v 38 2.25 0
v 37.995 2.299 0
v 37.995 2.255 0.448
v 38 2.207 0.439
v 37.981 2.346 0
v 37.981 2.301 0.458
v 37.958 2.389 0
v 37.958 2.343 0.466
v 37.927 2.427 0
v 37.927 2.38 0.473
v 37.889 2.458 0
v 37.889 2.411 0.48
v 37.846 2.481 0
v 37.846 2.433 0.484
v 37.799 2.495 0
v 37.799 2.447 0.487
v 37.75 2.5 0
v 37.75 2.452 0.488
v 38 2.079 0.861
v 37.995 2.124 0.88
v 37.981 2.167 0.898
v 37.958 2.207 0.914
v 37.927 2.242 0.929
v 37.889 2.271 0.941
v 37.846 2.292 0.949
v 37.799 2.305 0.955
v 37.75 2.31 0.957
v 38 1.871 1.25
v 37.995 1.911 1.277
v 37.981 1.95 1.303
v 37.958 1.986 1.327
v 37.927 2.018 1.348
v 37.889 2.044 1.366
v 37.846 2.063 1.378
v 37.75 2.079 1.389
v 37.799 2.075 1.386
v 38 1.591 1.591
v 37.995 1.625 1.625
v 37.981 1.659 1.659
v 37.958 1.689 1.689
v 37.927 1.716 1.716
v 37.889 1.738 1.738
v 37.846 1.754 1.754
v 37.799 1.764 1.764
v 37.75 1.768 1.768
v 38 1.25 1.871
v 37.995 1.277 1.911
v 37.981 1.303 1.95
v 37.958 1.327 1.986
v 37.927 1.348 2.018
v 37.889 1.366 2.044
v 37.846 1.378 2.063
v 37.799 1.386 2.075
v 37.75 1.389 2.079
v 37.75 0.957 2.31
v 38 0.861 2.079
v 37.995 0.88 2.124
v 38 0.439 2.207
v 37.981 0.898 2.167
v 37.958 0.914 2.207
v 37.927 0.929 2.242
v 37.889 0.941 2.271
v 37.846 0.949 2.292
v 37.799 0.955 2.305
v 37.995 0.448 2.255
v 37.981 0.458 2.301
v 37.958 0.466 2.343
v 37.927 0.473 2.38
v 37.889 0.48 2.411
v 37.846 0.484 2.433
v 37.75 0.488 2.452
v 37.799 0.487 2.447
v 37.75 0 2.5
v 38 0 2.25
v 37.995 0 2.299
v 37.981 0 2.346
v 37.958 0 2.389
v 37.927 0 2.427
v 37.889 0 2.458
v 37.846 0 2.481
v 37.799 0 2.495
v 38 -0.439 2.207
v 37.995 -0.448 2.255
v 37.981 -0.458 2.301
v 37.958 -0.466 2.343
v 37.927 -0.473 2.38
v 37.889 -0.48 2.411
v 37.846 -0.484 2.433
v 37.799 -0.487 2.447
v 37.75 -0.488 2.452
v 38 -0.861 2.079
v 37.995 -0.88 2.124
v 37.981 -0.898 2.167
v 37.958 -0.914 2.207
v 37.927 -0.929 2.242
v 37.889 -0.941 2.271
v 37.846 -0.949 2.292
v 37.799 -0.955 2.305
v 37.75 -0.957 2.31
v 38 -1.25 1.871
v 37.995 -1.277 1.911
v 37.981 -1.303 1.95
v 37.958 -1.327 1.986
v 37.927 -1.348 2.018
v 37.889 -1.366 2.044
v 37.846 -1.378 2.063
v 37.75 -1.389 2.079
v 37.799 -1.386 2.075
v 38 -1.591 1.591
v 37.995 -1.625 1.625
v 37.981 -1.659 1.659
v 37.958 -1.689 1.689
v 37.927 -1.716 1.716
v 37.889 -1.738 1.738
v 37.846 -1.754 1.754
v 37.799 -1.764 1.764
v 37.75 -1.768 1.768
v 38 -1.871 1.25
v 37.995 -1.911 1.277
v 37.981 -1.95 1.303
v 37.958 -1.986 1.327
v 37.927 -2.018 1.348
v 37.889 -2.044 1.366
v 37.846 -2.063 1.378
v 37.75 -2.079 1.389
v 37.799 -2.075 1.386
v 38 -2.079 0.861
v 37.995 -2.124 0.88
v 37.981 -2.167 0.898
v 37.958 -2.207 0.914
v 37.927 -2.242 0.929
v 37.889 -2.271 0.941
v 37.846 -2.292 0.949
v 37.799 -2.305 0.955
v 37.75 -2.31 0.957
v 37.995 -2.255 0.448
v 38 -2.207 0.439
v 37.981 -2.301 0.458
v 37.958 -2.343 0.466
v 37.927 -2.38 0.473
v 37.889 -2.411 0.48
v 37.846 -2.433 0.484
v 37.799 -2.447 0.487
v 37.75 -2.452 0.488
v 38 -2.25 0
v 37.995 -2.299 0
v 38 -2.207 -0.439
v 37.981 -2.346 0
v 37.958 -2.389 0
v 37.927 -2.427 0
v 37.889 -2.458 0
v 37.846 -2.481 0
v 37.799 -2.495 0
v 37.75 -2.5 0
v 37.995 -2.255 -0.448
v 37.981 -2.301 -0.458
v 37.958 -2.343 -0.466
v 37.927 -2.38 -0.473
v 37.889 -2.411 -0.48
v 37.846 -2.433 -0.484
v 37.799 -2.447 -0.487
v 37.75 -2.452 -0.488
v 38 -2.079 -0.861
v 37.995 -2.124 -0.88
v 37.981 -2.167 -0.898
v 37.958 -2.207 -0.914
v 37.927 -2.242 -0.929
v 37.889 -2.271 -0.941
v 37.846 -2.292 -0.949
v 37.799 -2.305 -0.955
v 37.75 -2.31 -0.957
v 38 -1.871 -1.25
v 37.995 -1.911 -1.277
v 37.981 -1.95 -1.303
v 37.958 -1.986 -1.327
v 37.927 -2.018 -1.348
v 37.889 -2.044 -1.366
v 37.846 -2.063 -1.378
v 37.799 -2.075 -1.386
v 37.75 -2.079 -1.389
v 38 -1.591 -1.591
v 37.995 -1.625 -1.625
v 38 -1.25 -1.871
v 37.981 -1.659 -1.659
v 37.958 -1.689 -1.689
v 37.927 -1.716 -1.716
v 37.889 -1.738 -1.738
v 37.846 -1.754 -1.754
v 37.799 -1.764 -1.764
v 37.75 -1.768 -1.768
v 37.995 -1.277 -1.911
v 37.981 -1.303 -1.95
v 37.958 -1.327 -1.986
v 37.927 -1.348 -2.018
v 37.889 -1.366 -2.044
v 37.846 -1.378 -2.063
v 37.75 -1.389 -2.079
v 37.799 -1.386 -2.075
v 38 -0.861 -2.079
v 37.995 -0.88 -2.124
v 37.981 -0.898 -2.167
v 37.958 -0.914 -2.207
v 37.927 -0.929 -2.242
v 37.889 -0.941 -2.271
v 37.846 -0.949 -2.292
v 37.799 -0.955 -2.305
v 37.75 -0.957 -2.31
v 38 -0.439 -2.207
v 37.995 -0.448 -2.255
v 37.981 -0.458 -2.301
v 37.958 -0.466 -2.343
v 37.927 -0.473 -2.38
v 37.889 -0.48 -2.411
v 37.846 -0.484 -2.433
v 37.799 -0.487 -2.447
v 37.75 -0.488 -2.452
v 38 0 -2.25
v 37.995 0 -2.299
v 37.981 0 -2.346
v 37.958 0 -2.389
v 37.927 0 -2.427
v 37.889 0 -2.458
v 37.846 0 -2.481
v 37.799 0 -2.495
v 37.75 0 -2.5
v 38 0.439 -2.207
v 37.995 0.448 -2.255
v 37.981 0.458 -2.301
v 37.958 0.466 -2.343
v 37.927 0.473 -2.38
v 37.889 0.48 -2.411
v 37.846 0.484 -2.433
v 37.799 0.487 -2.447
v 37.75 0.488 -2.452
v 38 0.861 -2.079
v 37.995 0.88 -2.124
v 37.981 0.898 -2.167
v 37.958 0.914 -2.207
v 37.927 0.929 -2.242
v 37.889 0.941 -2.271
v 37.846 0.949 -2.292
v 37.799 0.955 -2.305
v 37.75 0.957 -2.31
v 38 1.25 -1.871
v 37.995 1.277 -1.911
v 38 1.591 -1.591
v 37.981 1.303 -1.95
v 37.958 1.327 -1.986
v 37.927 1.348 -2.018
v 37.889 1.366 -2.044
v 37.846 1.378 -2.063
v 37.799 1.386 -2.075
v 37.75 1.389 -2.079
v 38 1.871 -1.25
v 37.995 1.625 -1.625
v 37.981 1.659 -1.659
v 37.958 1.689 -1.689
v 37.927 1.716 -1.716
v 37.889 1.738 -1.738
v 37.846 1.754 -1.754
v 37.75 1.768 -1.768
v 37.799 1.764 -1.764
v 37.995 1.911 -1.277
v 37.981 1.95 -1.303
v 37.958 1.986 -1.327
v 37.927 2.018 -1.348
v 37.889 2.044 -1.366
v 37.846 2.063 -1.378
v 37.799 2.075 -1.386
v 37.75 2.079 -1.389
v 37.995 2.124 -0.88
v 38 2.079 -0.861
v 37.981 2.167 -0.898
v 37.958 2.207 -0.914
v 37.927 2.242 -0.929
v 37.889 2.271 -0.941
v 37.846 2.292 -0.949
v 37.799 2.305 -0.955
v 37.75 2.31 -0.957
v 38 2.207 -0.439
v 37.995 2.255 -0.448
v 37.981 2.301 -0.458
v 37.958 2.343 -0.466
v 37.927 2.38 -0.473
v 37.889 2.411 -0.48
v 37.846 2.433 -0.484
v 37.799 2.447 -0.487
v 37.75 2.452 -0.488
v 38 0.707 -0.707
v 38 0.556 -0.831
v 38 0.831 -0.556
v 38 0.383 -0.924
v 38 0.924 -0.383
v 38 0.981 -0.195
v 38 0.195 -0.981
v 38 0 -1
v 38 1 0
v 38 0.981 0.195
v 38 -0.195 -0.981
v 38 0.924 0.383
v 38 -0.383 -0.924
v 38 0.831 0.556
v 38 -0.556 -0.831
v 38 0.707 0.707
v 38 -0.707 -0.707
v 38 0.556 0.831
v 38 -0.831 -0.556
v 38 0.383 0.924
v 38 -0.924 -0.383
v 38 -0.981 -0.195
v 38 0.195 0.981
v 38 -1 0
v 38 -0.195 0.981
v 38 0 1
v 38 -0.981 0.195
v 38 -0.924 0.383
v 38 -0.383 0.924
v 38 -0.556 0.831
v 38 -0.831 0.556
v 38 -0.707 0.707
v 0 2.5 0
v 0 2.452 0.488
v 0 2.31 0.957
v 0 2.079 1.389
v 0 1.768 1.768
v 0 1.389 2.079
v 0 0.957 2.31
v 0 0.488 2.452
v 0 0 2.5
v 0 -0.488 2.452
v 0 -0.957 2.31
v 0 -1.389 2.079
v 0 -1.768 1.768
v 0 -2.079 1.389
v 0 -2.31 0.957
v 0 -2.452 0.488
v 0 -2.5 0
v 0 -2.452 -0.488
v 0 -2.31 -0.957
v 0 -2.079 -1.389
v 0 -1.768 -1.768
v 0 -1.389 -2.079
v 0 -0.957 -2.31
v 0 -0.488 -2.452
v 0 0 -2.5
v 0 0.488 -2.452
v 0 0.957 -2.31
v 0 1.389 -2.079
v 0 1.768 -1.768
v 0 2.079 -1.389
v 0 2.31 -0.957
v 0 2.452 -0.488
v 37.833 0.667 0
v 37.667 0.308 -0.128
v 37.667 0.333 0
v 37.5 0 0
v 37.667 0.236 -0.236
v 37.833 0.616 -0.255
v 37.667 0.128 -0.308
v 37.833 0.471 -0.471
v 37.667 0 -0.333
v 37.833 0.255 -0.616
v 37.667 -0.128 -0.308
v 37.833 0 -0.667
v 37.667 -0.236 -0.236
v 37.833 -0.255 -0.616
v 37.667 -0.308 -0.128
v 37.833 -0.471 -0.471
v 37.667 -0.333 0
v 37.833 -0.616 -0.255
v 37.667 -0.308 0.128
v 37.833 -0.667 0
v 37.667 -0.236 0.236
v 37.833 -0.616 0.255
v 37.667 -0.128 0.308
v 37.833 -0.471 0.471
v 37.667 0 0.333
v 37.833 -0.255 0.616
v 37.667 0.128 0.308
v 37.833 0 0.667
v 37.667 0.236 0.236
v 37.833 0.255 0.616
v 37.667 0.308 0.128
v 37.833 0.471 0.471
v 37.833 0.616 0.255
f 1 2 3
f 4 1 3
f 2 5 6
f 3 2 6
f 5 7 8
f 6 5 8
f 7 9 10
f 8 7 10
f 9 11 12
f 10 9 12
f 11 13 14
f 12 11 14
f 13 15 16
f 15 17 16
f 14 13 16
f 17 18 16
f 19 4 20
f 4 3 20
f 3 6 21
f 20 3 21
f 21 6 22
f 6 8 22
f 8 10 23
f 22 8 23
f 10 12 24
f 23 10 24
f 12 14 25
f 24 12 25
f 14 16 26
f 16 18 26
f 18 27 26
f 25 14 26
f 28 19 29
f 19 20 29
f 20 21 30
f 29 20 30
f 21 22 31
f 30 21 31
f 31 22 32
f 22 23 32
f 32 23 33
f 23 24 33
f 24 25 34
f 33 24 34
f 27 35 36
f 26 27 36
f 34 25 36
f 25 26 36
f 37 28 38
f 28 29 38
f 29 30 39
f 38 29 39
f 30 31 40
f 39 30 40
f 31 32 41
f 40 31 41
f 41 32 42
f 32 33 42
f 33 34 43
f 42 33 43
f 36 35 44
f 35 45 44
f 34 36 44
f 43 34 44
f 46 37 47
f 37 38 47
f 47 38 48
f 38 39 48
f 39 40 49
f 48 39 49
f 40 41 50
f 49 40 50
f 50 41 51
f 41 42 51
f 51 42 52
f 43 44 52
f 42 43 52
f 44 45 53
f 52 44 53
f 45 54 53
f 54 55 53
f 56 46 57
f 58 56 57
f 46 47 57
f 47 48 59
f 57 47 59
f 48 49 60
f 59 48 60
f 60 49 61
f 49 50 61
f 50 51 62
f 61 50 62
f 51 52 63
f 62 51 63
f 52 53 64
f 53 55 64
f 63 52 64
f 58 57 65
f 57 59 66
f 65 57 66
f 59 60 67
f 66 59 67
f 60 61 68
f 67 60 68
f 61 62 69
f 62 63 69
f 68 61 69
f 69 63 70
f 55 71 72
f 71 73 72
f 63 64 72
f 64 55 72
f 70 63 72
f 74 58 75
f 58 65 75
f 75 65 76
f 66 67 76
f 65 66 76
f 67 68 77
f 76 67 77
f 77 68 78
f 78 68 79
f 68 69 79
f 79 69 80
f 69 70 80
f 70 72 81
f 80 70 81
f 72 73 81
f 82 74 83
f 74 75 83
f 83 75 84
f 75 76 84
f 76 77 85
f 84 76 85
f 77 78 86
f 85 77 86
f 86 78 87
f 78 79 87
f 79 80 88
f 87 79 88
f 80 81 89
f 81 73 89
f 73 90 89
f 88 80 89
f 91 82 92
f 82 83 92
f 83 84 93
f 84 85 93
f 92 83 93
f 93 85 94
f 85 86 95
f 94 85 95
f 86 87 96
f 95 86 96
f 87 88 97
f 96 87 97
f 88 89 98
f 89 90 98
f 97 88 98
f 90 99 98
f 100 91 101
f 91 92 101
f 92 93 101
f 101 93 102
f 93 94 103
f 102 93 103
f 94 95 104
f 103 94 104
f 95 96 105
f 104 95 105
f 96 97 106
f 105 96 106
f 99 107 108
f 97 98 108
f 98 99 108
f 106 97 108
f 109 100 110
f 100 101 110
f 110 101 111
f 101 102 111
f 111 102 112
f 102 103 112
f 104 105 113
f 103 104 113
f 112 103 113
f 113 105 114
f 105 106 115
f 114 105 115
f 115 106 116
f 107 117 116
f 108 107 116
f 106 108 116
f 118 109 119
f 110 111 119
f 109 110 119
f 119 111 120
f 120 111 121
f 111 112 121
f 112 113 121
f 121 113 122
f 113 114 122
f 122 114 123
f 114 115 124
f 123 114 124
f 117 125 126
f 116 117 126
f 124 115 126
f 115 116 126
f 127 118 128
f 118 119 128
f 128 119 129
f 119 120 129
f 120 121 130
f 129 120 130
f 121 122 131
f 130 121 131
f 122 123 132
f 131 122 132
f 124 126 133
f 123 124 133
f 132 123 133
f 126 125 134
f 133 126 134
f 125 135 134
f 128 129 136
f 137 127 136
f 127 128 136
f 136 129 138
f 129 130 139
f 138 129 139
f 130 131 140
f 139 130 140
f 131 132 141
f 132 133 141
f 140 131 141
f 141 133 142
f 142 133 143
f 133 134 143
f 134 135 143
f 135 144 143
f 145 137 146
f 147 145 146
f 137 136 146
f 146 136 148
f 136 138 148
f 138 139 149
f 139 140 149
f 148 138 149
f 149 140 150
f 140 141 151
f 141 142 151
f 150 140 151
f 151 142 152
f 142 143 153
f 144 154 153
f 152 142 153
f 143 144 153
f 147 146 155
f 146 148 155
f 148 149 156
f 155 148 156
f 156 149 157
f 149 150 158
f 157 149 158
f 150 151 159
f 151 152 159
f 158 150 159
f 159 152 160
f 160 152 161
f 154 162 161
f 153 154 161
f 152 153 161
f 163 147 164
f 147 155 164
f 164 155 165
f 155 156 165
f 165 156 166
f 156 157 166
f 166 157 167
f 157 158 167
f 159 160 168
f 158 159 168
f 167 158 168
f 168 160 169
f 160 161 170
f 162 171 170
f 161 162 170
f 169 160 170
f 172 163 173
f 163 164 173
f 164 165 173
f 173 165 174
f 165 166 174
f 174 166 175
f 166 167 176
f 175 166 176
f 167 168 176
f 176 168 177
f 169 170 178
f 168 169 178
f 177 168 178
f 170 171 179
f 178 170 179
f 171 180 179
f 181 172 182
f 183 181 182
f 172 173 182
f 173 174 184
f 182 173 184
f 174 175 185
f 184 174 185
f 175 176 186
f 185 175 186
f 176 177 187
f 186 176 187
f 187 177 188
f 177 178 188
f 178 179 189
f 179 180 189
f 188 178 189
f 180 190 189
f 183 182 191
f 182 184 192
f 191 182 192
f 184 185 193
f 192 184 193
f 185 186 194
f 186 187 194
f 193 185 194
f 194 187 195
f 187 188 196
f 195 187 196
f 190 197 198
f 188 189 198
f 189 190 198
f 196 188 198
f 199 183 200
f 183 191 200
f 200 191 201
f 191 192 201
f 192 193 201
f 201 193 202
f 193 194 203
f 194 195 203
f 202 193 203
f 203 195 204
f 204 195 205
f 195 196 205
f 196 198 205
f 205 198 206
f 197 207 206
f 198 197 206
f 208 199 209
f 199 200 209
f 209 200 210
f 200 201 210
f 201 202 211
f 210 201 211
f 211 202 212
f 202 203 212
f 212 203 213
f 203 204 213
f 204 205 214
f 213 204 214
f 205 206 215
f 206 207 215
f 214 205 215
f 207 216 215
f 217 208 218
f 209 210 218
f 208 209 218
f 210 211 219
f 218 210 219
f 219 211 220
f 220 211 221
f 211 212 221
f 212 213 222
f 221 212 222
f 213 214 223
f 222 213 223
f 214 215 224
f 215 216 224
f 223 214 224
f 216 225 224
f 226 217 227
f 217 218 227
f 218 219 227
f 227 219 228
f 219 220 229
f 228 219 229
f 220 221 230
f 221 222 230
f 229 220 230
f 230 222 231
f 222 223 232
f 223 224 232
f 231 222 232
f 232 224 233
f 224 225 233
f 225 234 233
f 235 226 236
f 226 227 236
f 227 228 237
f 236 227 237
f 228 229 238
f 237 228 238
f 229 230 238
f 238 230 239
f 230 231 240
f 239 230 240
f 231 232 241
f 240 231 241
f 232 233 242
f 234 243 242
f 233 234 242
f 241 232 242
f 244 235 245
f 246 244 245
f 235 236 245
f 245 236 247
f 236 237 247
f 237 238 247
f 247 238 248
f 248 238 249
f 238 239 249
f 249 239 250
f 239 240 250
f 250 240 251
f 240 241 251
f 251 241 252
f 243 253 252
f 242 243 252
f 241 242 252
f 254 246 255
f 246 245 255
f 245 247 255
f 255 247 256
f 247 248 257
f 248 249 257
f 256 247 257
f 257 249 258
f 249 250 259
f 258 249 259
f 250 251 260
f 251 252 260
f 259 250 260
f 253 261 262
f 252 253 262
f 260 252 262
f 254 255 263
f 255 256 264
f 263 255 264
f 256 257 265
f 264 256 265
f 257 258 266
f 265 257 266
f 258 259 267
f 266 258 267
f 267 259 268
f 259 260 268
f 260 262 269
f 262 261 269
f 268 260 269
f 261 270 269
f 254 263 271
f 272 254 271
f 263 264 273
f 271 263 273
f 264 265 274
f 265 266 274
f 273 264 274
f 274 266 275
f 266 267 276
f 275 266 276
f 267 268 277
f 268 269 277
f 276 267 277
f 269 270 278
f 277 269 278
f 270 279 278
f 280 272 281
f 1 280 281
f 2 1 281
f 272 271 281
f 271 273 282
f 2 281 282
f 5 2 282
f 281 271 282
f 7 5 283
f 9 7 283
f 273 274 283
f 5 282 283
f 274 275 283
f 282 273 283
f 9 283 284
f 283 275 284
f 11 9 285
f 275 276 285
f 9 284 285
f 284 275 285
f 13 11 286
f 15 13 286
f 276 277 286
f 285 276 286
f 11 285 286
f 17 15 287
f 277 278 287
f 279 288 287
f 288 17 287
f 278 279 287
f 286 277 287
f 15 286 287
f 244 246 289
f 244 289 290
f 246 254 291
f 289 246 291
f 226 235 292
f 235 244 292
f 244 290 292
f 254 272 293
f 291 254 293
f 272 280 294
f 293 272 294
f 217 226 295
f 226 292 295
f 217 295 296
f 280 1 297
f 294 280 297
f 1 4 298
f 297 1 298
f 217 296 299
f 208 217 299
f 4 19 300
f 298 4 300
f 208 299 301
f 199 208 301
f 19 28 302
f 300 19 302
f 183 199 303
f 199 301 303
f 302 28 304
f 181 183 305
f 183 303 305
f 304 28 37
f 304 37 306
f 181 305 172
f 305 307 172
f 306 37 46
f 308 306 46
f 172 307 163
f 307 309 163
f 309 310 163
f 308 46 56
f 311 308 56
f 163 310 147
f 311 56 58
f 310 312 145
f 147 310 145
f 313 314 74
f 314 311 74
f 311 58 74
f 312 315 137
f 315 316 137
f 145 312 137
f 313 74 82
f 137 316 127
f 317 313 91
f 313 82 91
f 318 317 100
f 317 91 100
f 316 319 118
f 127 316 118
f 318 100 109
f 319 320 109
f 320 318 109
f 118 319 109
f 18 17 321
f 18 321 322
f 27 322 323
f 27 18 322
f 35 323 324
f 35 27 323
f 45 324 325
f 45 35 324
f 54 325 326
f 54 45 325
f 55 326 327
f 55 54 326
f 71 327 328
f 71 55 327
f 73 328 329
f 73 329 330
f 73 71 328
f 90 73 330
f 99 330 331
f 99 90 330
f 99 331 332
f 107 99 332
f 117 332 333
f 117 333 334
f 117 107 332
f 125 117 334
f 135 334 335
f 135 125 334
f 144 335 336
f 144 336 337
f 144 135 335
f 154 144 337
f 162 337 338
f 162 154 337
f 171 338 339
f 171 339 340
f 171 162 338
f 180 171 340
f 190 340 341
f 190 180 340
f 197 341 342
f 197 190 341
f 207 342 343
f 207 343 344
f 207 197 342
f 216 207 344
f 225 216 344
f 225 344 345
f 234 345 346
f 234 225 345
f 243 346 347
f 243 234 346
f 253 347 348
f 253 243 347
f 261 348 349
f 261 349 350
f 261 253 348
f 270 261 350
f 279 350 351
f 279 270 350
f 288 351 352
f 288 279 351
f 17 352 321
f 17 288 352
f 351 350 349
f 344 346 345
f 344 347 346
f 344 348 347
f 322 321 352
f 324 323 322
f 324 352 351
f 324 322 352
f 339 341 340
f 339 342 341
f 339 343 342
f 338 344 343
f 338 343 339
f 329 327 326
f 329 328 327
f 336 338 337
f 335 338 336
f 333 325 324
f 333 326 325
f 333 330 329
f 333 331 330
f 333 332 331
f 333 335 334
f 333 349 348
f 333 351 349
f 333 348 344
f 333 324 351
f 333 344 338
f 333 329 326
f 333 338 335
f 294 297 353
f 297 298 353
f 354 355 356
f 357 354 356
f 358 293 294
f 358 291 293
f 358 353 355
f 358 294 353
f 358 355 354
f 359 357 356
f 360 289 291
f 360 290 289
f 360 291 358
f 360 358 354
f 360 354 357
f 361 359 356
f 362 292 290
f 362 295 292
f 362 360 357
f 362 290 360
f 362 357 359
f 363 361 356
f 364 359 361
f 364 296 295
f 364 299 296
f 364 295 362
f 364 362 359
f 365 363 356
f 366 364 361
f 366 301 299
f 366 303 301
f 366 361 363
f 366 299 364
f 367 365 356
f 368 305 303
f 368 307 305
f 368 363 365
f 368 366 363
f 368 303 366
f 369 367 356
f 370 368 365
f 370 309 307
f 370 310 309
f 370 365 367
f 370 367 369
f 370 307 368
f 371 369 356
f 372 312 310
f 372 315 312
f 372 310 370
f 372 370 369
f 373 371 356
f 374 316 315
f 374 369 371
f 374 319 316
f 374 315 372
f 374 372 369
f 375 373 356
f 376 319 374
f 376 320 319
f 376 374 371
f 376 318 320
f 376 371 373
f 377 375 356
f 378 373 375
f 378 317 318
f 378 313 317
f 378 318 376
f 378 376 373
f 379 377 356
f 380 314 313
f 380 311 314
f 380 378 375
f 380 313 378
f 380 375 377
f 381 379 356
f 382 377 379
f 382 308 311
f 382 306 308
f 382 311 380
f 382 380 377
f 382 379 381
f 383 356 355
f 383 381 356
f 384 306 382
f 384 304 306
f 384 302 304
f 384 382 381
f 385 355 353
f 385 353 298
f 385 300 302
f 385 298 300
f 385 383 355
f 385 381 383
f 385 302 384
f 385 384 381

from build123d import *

# Parameters (mm, degrees)
CROQUIS1_W  = 38
CROQUIS1_H  = 2.5
REDONDEO1_R = 0.25


with BuildPart() as part:
    # Croquis1 → Revolución1 (revolve)
    with BuildSketch(Plane.XY):
        with Locations((19, 1.25)):
            Rectangle(CROQUIS1_W, CROQUIS1_H)
    revolve(axis=Axis((0, 0, 0), (1, 0, 0)))

    # Redondeo1
    redondeo1_edges = [part.edges().sort_by_distance(p)[0] for p in [
        (38, -2.5, 0),
    ]]
    fillet(redondeo1_edges, radius=REDONDEO1_R)

    # Croquis3 → Cortar-Revolución1 (revolve, cut)
    with BuildSketch(Plane.XY):
        Polygon((38, 0), (37.5, 0), (38, 1), align=None)
    revolve(axis=Axis((38, 0, 0), (-1, 0, 0)), mode=Mode.SUBTRACT)


solid = part.part
